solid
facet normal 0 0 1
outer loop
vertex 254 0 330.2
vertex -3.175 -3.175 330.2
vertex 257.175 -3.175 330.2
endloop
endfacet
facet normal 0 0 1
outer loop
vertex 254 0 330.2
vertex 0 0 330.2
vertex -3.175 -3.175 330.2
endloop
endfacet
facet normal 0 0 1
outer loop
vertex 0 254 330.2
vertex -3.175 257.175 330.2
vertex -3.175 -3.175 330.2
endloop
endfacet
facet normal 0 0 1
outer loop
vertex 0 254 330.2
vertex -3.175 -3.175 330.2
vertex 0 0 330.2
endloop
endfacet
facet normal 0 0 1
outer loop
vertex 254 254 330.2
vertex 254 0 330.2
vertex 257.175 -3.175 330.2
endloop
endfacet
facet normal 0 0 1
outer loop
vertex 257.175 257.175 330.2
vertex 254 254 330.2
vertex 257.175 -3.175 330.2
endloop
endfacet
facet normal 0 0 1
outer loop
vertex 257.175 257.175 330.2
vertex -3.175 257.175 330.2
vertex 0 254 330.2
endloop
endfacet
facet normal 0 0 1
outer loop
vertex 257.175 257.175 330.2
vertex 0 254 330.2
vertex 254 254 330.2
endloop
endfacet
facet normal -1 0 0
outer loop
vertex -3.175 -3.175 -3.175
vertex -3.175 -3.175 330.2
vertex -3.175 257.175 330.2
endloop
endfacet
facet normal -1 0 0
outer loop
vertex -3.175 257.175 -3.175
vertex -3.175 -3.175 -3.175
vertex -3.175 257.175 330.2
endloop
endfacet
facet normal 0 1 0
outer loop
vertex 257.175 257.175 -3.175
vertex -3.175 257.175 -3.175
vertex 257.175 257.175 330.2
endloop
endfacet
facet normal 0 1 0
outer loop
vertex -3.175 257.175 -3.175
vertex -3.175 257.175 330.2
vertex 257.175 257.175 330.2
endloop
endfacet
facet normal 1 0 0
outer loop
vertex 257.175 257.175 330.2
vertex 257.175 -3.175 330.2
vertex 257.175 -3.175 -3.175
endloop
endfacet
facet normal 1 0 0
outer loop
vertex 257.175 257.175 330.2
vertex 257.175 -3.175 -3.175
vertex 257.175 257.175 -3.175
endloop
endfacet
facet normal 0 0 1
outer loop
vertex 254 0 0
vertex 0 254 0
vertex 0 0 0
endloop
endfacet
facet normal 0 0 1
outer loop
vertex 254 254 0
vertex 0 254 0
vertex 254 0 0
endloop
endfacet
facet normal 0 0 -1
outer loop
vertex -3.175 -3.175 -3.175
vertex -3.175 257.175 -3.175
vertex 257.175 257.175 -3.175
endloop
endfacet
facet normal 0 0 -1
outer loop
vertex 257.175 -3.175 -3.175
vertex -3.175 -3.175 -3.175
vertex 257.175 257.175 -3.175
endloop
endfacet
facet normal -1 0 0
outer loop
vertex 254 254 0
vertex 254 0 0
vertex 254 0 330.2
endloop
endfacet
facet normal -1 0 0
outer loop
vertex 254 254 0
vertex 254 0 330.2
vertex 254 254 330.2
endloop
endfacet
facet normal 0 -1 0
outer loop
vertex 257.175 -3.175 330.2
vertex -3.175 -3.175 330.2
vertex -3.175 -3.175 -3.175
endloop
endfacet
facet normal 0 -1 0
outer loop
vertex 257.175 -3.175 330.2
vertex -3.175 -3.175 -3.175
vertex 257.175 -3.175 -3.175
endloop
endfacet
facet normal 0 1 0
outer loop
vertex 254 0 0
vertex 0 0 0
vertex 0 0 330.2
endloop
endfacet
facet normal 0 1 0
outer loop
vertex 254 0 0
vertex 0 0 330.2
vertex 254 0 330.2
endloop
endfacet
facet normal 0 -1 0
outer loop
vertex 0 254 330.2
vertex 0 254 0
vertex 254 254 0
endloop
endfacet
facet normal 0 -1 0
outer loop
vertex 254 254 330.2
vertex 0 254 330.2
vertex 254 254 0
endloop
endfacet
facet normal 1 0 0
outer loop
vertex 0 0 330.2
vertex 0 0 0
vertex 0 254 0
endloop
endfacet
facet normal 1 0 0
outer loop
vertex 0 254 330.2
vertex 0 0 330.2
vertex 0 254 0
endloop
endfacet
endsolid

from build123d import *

# Parameters (mm, degrees)
SKETCH1_W           = 260.35
SKETCH1_H           = 260.35
SKETCH1_W_2         = 254
SKETCH1_H_2         = 254
BOSS_EXTRUDE1_DEPTH = 330.2
SKETCH1_2_W         = 260.35
SKETCH1_2_H         = 260.35
BOSS_EXTRUDE2_DEPTH = 3.175


with BuildPart() as part:
    # Sketch1 → Boss-Extrude1 (new body)
    with BuildSketch(Plane.XY):
        with Locations((127, 127)):
            Rectangle(SKETCH1_W, SKETCH1_H)
        with Locations((127, 127)):
            Rectangle(SKETCH1_W_2, SKETCH1_H_2, mode=Mode.SUBTRACT)
    extrude(amount=BOSS_EXTRUDE1_DEPTH)

    # Sketch1<2> → Boss-Extrude2 (add)
    with BuildSketch(Plane.XY):
        with Locations((127, 127)):
            Rectangle(SKETCH1_2_W, SKETCH1_2_H)
    extrude(amount=-BOSS_EXTRUDE2_DEPTH)


solid = part.part
